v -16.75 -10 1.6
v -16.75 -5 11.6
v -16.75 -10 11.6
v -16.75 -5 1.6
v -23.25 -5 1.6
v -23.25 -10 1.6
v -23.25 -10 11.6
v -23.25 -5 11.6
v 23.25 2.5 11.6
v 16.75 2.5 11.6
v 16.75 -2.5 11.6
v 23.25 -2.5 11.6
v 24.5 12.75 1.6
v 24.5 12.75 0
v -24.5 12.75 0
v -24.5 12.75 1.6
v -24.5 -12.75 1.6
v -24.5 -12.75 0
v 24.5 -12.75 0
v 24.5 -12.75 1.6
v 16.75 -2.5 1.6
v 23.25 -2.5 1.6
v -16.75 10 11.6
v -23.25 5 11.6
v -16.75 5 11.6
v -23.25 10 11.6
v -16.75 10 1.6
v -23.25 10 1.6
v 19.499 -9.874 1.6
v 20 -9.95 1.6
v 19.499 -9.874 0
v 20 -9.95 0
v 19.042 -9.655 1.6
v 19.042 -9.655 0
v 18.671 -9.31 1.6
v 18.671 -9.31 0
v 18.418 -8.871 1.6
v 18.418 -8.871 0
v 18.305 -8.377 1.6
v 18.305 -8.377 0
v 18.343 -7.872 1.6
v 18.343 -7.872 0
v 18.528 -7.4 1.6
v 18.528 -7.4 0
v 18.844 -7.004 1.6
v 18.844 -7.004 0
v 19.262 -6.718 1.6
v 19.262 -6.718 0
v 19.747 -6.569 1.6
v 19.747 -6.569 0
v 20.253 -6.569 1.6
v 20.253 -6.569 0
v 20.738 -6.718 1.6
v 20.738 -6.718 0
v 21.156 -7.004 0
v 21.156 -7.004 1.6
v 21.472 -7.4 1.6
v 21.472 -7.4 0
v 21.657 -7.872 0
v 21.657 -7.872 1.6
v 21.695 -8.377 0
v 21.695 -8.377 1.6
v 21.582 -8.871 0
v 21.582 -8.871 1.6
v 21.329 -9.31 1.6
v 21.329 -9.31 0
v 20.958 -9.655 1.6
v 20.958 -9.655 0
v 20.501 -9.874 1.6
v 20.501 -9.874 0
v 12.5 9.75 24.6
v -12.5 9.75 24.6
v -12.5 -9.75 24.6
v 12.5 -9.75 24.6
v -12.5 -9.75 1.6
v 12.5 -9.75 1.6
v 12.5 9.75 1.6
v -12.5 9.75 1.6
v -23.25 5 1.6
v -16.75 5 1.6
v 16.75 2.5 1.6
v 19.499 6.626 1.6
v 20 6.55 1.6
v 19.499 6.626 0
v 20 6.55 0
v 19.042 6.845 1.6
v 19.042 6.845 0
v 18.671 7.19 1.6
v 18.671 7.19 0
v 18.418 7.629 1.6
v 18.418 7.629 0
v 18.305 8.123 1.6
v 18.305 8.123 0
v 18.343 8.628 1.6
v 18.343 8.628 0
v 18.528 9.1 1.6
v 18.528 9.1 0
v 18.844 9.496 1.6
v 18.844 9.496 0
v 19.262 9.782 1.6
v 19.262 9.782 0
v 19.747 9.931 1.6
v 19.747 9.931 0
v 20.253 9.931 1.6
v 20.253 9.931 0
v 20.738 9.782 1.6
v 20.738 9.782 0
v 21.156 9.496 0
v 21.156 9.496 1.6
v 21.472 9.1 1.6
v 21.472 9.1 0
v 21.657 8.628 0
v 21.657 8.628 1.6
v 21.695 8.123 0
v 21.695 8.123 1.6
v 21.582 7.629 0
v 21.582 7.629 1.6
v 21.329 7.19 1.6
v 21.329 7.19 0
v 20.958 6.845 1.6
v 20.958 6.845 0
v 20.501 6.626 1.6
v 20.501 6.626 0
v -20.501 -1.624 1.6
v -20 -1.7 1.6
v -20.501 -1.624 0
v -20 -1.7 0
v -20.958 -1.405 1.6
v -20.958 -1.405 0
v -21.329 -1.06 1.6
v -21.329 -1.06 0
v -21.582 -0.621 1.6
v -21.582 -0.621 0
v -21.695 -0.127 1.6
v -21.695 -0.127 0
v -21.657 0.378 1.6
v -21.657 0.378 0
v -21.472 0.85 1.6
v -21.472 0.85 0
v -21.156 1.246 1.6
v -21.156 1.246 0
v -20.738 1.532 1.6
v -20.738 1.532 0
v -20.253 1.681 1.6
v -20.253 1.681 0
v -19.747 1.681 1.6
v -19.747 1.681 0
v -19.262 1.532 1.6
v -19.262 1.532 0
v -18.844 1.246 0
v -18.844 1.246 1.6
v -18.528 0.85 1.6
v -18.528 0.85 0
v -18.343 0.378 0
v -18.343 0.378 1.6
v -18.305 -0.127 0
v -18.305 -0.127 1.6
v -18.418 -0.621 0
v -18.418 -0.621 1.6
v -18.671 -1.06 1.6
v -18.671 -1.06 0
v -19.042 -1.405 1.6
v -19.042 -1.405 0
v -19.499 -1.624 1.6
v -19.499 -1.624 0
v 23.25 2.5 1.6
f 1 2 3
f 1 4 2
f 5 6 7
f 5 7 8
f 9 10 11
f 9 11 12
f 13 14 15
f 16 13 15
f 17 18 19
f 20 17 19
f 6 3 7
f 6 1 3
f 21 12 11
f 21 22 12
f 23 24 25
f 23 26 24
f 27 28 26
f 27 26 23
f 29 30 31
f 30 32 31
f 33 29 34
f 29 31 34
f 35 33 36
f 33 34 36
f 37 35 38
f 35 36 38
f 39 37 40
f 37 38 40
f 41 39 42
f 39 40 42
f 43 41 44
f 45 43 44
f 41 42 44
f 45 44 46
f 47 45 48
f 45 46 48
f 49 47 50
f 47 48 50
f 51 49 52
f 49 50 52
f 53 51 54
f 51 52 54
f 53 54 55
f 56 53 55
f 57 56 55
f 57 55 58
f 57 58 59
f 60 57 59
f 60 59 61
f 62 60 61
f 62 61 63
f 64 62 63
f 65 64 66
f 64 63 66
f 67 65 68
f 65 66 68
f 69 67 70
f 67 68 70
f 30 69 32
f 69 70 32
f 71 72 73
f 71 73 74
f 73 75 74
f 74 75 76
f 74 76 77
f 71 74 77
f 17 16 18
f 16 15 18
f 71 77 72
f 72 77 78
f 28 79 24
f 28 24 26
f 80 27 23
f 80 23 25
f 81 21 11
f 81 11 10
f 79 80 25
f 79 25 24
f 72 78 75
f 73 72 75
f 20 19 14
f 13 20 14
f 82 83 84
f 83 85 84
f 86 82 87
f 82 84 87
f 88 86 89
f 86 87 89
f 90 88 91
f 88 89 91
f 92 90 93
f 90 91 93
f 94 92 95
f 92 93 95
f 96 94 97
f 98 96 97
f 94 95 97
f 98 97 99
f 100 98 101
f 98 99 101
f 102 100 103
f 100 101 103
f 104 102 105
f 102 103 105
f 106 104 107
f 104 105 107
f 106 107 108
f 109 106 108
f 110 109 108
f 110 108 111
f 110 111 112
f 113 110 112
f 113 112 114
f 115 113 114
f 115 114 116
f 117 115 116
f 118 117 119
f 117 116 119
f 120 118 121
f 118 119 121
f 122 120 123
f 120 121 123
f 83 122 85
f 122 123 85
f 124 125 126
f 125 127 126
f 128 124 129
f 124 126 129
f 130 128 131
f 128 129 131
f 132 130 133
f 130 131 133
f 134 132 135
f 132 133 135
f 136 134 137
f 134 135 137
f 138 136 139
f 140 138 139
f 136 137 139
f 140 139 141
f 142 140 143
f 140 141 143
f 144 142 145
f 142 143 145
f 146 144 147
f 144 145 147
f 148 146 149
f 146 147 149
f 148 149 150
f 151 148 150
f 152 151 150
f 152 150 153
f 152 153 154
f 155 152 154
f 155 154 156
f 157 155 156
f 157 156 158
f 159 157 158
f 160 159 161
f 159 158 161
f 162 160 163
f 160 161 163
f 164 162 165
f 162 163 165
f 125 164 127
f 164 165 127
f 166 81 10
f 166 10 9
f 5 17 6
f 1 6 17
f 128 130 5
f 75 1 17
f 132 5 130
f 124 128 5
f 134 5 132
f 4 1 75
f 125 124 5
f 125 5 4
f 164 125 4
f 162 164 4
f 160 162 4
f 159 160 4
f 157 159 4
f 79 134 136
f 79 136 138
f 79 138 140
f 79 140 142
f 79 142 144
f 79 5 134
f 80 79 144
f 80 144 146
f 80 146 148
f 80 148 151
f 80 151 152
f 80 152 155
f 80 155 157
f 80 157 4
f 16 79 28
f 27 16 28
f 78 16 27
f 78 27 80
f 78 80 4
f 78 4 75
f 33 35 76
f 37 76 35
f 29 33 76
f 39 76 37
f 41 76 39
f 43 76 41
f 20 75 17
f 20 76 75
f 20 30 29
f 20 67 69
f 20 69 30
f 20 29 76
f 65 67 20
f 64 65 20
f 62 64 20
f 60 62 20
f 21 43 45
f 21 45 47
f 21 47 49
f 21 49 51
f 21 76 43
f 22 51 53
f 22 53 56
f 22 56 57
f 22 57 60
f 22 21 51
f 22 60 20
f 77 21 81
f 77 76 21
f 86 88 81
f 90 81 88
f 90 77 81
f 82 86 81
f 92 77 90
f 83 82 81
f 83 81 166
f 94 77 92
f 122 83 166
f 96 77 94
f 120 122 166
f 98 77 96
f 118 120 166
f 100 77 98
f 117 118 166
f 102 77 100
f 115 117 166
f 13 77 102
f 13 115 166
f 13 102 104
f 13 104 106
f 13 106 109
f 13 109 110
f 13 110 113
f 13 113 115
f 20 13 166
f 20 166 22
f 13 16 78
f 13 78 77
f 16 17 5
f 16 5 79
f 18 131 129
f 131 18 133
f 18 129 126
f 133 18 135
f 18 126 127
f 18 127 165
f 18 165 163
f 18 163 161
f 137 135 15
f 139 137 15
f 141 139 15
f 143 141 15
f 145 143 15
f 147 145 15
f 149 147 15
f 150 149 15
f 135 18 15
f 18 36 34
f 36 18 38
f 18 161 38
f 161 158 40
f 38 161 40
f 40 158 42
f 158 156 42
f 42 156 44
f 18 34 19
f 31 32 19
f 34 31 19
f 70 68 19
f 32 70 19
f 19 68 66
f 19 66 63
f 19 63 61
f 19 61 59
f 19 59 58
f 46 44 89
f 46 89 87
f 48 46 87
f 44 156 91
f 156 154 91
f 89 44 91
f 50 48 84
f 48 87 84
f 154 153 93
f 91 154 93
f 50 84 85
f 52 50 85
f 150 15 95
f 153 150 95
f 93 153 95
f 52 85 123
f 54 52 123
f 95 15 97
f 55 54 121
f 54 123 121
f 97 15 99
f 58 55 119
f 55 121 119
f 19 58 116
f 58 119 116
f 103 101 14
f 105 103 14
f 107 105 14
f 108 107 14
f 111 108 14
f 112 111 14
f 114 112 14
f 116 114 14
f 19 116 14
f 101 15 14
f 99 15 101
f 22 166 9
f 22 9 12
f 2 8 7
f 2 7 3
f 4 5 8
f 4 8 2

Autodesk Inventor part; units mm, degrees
ref_plane "YZ Plane" through (0, 0, 0) normal (1, 0, 0) x (0, 1, 0)
ref_plane "XZ Plane" through (0, 0, 0) normal (0, 1, 0) x (-1, 0, 0)
ref_plane "XY Plane" through (0, 0, 0) normal (0, 0, 1) x (1, 0, 0)
sketch "Sketch1" plane through (0, 0, 0) normal (0, 0, 1) x (1, 0, 0)
  line L0 (-24.5, -12.75) -> (24.5, -12.75)
  line L1 (24.5, -12.75) -> (24.5, 12.75)
  line L2 (24.5, 12.75) -> (-24.5, 12.75)
  line L3 (-24.5, 12.75) -> (-24.5, -12.75)
  line L4 (-24.5, -12.75) -> (24.5, 12.75) construction
  line L5 (24.5, -12.75) -> (-24.5, 12.75) construction
  point P0 (0, 0)
  dimension "d0" = 49
  dimension "d1" = 25.5
extrude "Extrusion1" add sketch "Sketch1" along normal blind 1.6
sketch "Sketch2" plane through (0, 0, 1.6) normal (0, 0, 1) x (1, 0, 0)
  line L0 (-12.5, -9.75) -> (12.5, -9.75)
  line L1 (12.5, -9.75) -> (12.5, 9.75)
  line L2 (12.5, 9.75) -> (-12.5, 9.75)
  line L3 (-12.5, 9.75) -> (-12.5, -9.75)
  line L4 (-12.5, -9.75) -> (12.5, 9.75) construction
  line L5 (12.5, -9.75) -> (-12.5, 9.75) construction
  point P0 (0, 0)
  dimension "d4" = 25
  dimension "d5" = 19.5
extrude "Extrusion2" add sketch "Sketch2" along normal blind 23
sketch "Sketch3" plane through (0, 0, 1.6) normal (0, 0, 1) x (1, 0, 0)
  line L0 (16.75, 2.5) -> (23.25, 2.5)
  line L1 (23.25, 2.5) -> (23.25, -2.5)
  line L2 (23.25, -2.5) -> (16.75, -2.5)
  line L3 (16.75, -2.5) -> (16.75, 2.5)
  line L4 (-23.25, 10) -> (-16.75, 10)
  line L5 (-16.75, 10) -> (-16.75, 5)
  line L6 (-16.75, 5) -> (-23.25, 5)
  line L7 (-23.25, 5) -> (-23.25, 10)
  line L8 (-23.25, -5) -> (-16.75, -5)
  line L9 (-16.75, -5) -> (-16.75, -10)
  line L10 (-16.75, -10) -> (-23.25, -10)
  line L11 (-23.25, -10) -> (-23.25, -5)
  line L12 (24.5, -12.75) -> (24.5, 12.75) construction
  line L13 (-16.75, 5) -> (-16.75, -5) construction
  point P0 (0, 0)
  point P1 (23.25, 0)
  point P2 (-16.75, 0)
  dimension "d8" = 5
  dimension "d9" = 5
  dimension "d10" = 5
  dimension "d11" = 6.5
  dimension "d12" = 6.5
  dimension "d13" = 6.5
  dimension "d14" = 33.5
  dimension "d15" = 1.25
  dimension "d16" = 10
extrude "Extrusion3" add sketch "Sketch3" along normal blind 10
sketch "Sketch4" plane through (0, 0, 1.6) normal (0, 0, 1) x (1, 0, 0)
  line L0 (20, 8.25) -> (20, -8.25) construction
  line L1 (-24.5, 12.75) -> (-24.5, -12.75) projected
  point P0 (0, 0)
  point P1 (-20, 0)
  point P2 (20, 0)
  dimension "d19" = 40
  dimension "d20" = 16.5
  dimension "d21" = 4.5
hole "Hole1" at (-20, 0, 1.6) at (20, 8.25, 1.6) at (20, -8.25, 1.6) direction (0, 0, -1) diameter 3.4 depth 8 tip angle 118 clearance for "Countersunk Flat Head Screw DIN EN ISO 2009" size "M3" standard "DIN"
properties part number "GDT"
